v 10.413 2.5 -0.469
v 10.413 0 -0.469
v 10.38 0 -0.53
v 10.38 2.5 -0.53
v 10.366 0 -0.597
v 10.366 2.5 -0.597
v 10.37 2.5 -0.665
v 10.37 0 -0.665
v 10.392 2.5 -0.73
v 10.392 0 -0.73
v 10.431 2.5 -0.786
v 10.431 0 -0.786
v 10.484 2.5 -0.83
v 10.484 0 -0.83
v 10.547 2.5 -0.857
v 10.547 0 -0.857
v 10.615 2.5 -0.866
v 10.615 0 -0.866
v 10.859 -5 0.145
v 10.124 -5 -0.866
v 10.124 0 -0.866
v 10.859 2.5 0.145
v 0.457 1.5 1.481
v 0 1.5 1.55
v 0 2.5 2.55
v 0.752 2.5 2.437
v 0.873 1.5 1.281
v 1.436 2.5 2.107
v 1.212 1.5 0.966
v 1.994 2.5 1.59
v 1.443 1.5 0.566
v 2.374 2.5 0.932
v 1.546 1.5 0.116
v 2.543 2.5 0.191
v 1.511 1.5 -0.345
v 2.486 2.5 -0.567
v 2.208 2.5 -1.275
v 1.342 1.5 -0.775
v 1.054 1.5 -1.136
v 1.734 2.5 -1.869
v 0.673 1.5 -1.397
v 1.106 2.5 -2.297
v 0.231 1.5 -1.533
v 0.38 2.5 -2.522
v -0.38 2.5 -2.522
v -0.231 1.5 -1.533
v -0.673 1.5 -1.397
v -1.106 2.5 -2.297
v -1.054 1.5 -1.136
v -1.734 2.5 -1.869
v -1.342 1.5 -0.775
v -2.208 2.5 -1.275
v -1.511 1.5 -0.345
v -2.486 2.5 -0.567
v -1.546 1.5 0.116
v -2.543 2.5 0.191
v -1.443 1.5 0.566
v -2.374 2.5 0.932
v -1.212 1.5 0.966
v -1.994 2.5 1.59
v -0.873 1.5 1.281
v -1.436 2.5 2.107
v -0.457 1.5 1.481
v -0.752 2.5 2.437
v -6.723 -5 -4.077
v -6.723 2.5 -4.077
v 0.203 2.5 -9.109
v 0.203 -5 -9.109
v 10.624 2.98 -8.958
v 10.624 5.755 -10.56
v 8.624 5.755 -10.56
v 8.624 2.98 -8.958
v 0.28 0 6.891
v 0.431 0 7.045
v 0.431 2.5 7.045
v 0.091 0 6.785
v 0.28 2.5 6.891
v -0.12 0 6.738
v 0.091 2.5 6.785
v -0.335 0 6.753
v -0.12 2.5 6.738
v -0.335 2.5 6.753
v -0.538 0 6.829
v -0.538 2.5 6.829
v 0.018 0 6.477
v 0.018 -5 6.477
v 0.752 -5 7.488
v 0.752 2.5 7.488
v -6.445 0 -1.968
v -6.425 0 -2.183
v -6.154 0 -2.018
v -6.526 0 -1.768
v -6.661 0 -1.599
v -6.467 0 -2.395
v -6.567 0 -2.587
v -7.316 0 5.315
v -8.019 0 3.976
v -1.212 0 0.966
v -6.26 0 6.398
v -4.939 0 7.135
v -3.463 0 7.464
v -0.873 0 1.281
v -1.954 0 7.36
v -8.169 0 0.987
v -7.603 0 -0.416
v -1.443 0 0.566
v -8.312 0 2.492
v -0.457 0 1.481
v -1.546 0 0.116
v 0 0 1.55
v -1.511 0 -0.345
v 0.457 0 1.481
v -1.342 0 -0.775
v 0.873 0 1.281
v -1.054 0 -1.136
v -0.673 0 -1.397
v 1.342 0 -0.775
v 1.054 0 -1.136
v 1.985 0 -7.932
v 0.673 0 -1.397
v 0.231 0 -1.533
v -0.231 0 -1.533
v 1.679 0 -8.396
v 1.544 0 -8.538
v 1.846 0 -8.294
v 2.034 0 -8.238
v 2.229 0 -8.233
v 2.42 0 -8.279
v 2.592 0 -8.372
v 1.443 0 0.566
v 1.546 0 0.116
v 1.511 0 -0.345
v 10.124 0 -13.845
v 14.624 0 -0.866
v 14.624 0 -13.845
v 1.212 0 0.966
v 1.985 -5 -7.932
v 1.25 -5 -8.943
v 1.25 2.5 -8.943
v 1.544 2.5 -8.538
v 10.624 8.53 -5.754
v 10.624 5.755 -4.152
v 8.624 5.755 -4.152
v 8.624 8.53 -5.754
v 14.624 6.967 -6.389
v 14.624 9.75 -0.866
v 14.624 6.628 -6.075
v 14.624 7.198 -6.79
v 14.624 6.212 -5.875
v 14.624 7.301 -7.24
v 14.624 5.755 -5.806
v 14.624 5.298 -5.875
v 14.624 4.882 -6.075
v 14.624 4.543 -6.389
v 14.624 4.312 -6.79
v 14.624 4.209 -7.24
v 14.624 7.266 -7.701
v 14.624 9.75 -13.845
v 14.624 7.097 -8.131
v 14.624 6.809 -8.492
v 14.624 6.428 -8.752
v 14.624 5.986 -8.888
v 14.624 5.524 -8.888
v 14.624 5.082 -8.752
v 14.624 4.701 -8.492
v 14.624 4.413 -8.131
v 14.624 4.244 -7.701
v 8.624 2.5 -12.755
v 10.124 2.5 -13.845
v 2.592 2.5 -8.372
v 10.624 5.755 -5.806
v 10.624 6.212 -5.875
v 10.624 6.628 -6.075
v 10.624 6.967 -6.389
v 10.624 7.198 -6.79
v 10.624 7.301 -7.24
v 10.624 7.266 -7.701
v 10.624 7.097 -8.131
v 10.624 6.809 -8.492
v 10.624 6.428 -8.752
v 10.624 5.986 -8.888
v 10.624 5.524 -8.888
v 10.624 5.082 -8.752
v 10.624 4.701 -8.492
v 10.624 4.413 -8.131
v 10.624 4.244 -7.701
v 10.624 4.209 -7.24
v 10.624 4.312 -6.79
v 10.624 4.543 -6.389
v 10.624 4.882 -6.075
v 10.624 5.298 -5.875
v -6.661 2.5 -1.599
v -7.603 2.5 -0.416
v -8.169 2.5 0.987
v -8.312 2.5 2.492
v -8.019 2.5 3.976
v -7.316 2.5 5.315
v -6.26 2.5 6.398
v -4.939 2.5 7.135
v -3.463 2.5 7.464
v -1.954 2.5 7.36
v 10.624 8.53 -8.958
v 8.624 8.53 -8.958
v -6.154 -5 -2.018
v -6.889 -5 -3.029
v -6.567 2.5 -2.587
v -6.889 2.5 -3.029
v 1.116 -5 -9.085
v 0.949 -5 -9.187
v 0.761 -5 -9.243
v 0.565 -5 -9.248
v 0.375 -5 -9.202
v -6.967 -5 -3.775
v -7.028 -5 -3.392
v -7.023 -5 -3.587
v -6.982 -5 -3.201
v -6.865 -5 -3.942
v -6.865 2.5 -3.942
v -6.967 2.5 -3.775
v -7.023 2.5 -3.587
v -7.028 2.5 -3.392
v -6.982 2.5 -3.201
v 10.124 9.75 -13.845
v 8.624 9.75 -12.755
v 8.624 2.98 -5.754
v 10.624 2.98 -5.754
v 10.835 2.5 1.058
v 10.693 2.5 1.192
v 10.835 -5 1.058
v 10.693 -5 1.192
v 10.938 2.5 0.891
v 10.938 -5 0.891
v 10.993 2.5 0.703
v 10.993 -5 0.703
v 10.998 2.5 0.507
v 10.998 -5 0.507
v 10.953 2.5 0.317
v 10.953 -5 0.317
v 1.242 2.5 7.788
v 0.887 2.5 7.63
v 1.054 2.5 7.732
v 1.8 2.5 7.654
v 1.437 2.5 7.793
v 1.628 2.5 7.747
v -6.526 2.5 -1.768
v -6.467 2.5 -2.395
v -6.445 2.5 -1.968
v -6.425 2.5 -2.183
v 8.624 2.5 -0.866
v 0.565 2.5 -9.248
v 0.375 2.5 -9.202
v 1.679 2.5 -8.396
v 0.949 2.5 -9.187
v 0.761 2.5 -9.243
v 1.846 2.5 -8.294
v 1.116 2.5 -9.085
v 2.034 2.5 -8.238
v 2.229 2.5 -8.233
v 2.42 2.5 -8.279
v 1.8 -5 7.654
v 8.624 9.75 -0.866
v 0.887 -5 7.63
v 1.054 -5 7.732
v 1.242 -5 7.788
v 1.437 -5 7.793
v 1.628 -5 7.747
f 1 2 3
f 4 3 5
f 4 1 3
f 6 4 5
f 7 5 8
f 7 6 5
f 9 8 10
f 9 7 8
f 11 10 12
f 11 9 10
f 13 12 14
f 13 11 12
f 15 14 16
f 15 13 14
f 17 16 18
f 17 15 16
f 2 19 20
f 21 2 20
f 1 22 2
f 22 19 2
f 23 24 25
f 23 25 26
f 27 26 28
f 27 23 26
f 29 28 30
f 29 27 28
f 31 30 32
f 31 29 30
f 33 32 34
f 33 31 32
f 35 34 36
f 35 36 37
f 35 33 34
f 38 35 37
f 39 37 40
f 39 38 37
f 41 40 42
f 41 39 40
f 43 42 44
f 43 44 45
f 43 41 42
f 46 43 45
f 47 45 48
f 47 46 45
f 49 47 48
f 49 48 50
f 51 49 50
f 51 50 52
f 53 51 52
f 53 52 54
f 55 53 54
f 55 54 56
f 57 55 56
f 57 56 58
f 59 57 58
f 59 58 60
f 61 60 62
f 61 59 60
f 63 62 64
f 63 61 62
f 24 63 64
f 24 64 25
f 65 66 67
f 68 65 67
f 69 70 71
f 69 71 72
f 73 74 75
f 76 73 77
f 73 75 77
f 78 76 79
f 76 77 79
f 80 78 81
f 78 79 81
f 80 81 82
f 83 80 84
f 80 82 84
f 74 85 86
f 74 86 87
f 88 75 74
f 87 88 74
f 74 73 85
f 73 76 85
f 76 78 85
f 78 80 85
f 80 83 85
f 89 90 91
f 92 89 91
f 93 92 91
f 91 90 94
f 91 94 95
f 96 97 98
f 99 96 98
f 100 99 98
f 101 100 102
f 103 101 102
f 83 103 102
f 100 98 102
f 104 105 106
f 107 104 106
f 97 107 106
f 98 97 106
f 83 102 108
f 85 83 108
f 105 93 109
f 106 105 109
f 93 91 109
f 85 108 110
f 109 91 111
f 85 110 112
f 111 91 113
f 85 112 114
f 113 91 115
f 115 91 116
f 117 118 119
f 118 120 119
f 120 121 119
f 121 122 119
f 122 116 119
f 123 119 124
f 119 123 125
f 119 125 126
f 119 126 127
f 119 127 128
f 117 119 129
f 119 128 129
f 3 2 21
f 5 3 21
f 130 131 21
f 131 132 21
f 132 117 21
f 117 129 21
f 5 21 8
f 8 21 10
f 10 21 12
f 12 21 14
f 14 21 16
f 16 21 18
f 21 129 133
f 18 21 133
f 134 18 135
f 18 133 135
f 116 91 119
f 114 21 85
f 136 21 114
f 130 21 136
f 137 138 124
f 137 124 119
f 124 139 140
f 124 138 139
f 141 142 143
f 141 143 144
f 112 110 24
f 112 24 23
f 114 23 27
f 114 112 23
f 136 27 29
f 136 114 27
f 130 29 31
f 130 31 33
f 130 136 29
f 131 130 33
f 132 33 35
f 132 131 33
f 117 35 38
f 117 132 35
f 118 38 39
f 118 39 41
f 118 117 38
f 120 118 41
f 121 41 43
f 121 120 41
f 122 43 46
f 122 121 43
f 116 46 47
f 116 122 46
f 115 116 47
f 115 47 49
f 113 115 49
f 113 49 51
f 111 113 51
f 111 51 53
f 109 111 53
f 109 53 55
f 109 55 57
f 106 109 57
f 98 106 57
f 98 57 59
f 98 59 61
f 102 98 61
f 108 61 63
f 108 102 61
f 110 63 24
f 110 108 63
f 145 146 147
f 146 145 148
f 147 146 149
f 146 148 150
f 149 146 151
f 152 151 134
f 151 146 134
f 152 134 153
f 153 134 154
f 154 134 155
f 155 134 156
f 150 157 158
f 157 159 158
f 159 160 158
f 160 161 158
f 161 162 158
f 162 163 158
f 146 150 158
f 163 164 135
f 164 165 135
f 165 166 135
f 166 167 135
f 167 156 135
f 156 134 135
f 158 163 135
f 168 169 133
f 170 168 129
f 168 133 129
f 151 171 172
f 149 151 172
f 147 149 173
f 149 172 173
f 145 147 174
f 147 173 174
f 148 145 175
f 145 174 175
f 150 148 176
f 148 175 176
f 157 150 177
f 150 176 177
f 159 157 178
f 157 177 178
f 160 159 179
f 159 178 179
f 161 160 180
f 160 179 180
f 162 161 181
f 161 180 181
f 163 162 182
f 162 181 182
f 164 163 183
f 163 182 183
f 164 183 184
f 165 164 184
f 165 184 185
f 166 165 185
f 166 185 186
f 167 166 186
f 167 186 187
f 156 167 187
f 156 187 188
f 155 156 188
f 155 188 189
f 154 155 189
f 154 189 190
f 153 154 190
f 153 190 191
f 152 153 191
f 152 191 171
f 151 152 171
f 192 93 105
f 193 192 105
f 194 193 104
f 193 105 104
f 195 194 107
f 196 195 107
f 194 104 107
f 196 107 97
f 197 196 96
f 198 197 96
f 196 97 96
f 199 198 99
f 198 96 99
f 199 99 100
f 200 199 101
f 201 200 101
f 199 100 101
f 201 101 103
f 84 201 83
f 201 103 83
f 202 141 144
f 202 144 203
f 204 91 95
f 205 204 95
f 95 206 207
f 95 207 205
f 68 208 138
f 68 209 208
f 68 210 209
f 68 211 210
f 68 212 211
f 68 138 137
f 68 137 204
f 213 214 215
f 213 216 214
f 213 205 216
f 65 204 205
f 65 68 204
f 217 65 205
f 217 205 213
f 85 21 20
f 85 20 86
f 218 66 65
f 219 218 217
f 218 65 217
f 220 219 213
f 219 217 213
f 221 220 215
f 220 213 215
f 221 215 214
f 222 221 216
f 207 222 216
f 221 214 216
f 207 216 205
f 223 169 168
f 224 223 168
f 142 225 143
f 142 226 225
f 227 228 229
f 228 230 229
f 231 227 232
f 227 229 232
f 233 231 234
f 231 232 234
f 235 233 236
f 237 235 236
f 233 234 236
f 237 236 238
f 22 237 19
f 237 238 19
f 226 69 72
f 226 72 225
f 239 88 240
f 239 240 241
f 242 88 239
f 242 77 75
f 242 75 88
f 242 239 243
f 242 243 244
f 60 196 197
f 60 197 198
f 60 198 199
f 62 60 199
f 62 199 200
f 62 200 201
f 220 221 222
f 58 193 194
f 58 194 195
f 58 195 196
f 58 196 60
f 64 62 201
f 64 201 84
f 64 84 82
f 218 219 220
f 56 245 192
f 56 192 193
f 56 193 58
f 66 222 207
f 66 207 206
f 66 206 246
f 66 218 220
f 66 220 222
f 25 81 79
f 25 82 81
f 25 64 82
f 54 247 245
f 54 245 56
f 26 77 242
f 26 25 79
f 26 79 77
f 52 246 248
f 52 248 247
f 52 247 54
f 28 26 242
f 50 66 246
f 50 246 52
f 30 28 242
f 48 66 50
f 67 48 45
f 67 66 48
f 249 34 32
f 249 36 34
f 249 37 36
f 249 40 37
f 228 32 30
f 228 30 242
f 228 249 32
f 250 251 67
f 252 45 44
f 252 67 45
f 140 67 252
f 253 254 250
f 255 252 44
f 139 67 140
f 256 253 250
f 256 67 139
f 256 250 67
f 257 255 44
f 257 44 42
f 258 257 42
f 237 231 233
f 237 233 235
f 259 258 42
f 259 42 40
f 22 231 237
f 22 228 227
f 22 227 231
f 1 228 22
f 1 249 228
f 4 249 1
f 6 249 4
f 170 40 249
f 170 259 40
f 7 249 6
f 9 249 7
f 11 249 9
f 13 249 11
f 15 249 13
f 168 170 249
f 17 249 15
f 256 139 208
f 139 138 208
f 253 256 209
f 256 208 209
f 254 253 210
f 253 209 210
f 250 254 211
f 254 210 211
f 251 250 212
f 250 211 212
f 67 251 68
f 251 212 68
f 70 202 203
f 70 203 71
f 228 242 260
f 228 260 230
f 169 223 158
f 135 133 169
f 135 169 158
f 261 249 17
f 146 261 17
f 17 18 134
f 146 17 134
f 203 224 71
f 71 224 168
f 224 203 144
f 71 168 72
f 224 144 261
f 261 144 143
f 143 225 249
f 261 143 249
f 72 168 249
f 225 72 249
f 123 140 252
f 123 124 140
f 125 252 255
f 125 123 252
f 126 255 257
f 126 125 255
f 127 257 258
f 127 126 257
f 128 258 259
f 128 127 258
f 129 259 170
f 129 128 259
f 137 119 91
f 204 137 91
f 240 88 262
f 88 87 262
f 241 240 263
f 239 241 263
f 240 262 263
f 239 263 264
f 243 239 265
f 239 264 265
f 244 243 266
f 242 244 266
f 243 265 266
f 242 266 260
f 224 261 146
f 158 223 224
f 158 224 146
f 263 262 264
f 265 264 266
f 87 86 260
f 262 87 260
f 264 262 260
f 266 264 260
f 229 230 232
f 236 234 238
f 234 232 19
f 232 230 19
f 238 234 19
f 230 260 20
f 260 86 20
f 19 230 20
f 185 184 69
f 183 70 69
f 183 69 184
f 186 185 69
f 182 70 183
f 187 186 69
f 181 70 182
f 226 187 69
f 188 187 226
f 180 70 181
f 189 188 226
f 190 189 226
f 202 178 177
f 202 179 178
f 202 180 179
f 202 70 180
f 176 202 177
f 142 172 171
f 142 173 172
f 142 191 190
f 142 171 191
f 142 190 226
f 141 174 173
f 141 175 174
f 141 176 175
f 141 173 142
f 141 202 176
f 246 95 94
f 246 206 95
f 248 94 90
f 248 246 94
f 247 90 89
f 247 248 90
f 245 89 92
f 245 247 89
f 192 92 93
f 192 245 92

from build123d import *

# Parameters (mm, degrees)
SKETCH_1_R             = 1.55
EXTRUDE_409_DEPTH      = 2.5
EXTRUDE_START          = 2.5
EXTRUDE_652_DEPTH      = 7.5
SKETCH_3_W             = 4.5
SKETCH_3_H             = 12.978713764
EXTRUDE_1_DEPTH        = 9.75
CHAMFER_1_SIZE         = 1
CUT_EXTRUDE_1251_DEPTH = 2
CUT_EXTRUDE_M3_REACH   = 27.038
SKETCH_6_R             = 1.55
EXTRUDE_1_2_DEPTH      = 7.25
CUT_EXTRUDE_1709_DEPTH = 26.037686694
EXTRUDE_START_2        = 1.5
SKETCH_8_R             = 1.55
EXTRUDE_2_DEPTH        = 1.5
FILLET_5_R             = 0.75
FILLET_6_R             = 0.25


with BuildPart() as part:
    # 草图1 → Extrude 409 (new body)
    with BuildSketch(Plane(origin=(0, 0, 0), x_dir=(1, 0, 0), z_dir=(0, 1, 0))):
        with BuildLine():
            Line((10.1243866, 13.845154317), (-6.15423406, 2.01804411))
            ThreePointArc((-6.15423406, 2.01804411), (-7.315700706, -5.315167685), (0.017511089, -6.476634331))
            Line((0.017511089, -6.476634331), (10.1243866, 0.866440553))
            Line((10.1243866, 0.866440553), (10.1243866, 13.845154317))
        make_face()
        with Locations(Location((0, 0, 0), (0, 0, 270))):
            Circle(SKETCH_1_R, mode=Mode.SUBTRACT)
    extrude(amount=EXTRUDE_409_DEPTH)

    # 草图2 → Extrude 652 (add)
    with BuildSketch(Plane(origin=(0, 0, 0), x_dir=(1, 0, 0), z_dir=(0, 1, 0)).offset(EXTRUDE_START)):
        Polygon((0.017511089, -6.476634331), (1.193081594, -8.09466832), (11.299957105, -0.751593436), (10.1243866, 0.866440553), align=None)
        Polygon((-7.329804565, 3.636078099), (0.809505765, 9.549633202), (1.98507627, 7.931599213), (-6.15423406, 2.01804411), align=None)
    extrude(amount=-EXTRUDE_652_DEPTH)

    # 草图3 → Extrude 1 (add)
    with BuildSketch(Plane(origin=(0, 0, 0), x_dir=(1, 0, 0), z_dir=(0, 1, 0))):
        with Locations((12.3743866, 7.355797435)):
            Rectangle(SKETCH_3_W, SKETCH_3_H)
    extrude(amount=EXTRUDE_1_DEPTH)

    # 倒角1
    chamfer_1_edges = [part.edges().sort_by_distance(p)[0] for p in [
        (0, 2.5, -1.55),
    ]]
    chamfer(chamfer_1_edges, length=CHAMFER_1_SIZE)

    # 草图5 → Cut-Extrude 1251 (cut)
    with BuildSketch(Plane.ZY.offset(-10.1243866)):
        Polygon((-4.151503441, 5.755), (-5.753650438, 8.53), (-8.957944432, 8.53), (-10.560091429, 5.755), (-8.957944432, 2.98), (-5.753650438, 2.98), align=None)
    extrude(amount=-CUT_EXTRUDE_1251_DEPTH, mode=Mode.SUBTRACT)

    # 草图6 → M3螺孔 (cut, up to next)
    with BuildSketch(Plane.ZY.offset(-10.1243866), mode=Mode.PRIVATE) as cut_extrude_m3_sk1:
        with Locations((-7.355797435, 5.755)):
            Circle(SKETCH_6_R)
    cut_extrude_m3_tool1 = extrude(cut_extrude_m3_sk1.sketch, amount=-CUT_EXTRUDE_M3_REACH, mode=Mode.PRIVATE) & part.part
    add(cut_extrude_m3_tool1.solids().sort_by_distance((10.124387, 5.755, -7.355797))[0], mode=Mode.SUBTRACT)

    # 草图7 → Extrude 1 2 (add)
    with BuildSketch(Plane(origin=(0, 0, 0), x_dir=(1, 0, 0), z_dir=(0, 1, 0)).offset(EXTRUDE_START)):
        Polygon((10.1243866, 13.845154317), (8.6243866, 12.755340525), (8.6243866, 0.866440553), (10.1243866, 0.866440553), align=None)
    extrude(amount=EXTRUDE_1_2_DEPTH)

    # 草图5<2> → Cut-Extrude 1709 (cut, through all)
    with BuildSketch(Plane.ZY.offset(-10.1243866)):
        Polygon((-4.151503441, 5.755), (-5.753650438, 8.53), (-8.957944432, 8.53), (-10.560091429, 5.755), (-8.957944432, 2.98), (-5.753650438, 2.98), align=None)
    extrude(amount=CUT_EXTRUDE_1709_DEPTH, mode=Mode.SUBTRACT)

    # 草图8 → 结构补强螺母位-2 (add)
    with BuildSketch(Plane.ZY.offset(-12.1243866).offset(EXTRUDE_START_2)):
        Polygon((-5.753650438, 2.98), (-4.151503441, 5.755), (-5.753650438, 8.53), (-8.957944432, 8.53), (-10.560091429, 5.755), (-8.957944432, 2.98), align=None)
        with Locations((-7.355797435, 5.755)):
            Circle(SKETCH_8_R, mode=Mode.SUBTRACT)
    extrude(amount=-EXTRUDE_2_DEPTH)

    # 圆角5
    fillet_5_edges = [part.edges().sort_by_distance(p)[0] for p in [
        (11.299957105, -1.25, 0.751593436),
        (1.193081594, -1.25, 8.09466832),
        (1.98507627, 1.25, -7.931599213),
        (-7.329804565, -1.25, -3.636078099),
        (0.809505765, -1.25, -9.549633202),
        (-6.15423406, 1.25, -2.01804411),
        (0.017511089, 1.25, 6.476634331),
    ]]
    fillet(fillet_5_edges, radius=FILLET_5_R)

    # 圆角6
    fillet_6_edges = [part.edges().sort_by_distance(p)[0] for p in [
        (10.1243866, 1.25, -0.866440553),
    ]]
    fillet(fillet_6_edges, radius=FILLET_6_R)


solid = part.part
